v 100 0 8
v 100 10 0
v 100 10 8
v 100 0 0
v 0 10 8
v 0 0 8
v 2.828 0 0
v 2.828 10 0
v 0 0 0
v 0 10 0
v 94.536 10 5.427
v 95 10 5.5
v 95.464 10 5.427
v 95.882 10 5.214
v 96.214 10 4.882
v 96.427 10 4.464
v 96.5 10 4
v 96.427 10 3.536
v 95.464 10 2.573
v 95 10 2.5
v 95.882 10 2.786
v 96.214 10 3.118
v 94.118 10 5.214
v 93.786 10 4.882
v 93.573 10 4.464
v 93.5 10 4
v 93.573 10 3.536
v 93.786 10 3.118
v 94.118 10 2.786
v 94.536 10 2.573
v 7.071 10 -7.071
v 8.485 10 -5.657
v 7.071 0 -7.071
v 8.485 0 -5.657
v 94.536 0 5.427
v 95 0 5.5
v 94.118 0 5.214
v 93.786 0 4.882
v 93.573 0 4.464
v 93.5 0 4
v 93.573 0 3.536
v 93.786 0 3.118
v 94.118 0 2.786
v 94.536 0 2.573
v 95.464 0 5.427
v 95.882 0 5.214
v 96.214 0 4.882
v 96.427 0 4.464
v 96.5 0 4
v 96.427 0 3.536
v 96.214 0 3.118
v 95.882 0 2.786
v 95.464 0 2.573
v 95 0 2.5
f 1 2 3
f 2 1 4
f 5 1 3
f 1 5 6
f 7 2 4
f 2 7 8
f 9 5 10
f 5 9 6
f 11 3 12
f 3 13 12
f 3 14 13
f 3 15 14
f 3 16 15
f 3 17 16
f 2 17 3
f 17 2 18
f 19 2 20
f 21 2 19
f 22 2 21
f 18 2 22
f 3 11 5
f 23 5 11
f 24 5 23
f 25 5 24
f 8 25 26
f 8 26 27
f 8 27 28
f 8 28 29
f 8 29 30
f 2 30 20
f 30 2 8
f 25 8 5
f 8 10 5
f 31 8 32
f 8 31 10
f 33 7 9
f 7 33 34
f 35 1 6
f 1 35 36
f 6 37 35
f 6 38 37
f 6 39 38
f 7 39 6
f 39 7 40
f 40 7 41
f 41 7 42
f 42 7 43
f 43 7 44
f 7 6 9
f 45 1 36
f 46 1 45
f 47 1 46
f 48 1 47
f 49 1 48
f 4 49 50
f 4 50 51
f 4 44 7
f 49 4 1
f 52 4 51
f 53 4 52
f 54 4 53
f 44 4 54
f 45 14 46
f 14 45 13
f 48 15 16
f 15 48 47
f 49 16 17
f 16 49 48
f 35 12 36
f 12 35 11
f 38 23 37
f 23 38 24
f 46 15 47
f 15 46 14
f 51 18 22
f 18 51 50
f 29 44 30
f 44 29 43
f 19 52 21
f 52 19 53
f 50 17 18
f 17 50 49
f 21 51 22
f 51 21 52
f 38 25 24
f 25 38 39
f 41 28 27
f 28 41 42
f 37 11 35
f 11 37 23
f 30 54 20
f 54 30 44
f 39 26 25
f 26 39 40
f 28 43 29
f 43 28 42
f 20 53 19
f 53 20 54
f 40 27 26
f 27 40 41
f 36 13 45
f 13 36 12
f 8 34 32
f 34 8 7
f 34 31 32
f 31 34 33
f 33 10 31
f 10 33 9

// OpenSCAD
difference(){
cube([100,10,8]);

translate([95,30,4]){
    rotate([90,0,0]){
        cylinder(40,1.5,1.5, $fn=20);
    }
}
}

rotate([0,45,0]){
cube([10,10,2]);
}
